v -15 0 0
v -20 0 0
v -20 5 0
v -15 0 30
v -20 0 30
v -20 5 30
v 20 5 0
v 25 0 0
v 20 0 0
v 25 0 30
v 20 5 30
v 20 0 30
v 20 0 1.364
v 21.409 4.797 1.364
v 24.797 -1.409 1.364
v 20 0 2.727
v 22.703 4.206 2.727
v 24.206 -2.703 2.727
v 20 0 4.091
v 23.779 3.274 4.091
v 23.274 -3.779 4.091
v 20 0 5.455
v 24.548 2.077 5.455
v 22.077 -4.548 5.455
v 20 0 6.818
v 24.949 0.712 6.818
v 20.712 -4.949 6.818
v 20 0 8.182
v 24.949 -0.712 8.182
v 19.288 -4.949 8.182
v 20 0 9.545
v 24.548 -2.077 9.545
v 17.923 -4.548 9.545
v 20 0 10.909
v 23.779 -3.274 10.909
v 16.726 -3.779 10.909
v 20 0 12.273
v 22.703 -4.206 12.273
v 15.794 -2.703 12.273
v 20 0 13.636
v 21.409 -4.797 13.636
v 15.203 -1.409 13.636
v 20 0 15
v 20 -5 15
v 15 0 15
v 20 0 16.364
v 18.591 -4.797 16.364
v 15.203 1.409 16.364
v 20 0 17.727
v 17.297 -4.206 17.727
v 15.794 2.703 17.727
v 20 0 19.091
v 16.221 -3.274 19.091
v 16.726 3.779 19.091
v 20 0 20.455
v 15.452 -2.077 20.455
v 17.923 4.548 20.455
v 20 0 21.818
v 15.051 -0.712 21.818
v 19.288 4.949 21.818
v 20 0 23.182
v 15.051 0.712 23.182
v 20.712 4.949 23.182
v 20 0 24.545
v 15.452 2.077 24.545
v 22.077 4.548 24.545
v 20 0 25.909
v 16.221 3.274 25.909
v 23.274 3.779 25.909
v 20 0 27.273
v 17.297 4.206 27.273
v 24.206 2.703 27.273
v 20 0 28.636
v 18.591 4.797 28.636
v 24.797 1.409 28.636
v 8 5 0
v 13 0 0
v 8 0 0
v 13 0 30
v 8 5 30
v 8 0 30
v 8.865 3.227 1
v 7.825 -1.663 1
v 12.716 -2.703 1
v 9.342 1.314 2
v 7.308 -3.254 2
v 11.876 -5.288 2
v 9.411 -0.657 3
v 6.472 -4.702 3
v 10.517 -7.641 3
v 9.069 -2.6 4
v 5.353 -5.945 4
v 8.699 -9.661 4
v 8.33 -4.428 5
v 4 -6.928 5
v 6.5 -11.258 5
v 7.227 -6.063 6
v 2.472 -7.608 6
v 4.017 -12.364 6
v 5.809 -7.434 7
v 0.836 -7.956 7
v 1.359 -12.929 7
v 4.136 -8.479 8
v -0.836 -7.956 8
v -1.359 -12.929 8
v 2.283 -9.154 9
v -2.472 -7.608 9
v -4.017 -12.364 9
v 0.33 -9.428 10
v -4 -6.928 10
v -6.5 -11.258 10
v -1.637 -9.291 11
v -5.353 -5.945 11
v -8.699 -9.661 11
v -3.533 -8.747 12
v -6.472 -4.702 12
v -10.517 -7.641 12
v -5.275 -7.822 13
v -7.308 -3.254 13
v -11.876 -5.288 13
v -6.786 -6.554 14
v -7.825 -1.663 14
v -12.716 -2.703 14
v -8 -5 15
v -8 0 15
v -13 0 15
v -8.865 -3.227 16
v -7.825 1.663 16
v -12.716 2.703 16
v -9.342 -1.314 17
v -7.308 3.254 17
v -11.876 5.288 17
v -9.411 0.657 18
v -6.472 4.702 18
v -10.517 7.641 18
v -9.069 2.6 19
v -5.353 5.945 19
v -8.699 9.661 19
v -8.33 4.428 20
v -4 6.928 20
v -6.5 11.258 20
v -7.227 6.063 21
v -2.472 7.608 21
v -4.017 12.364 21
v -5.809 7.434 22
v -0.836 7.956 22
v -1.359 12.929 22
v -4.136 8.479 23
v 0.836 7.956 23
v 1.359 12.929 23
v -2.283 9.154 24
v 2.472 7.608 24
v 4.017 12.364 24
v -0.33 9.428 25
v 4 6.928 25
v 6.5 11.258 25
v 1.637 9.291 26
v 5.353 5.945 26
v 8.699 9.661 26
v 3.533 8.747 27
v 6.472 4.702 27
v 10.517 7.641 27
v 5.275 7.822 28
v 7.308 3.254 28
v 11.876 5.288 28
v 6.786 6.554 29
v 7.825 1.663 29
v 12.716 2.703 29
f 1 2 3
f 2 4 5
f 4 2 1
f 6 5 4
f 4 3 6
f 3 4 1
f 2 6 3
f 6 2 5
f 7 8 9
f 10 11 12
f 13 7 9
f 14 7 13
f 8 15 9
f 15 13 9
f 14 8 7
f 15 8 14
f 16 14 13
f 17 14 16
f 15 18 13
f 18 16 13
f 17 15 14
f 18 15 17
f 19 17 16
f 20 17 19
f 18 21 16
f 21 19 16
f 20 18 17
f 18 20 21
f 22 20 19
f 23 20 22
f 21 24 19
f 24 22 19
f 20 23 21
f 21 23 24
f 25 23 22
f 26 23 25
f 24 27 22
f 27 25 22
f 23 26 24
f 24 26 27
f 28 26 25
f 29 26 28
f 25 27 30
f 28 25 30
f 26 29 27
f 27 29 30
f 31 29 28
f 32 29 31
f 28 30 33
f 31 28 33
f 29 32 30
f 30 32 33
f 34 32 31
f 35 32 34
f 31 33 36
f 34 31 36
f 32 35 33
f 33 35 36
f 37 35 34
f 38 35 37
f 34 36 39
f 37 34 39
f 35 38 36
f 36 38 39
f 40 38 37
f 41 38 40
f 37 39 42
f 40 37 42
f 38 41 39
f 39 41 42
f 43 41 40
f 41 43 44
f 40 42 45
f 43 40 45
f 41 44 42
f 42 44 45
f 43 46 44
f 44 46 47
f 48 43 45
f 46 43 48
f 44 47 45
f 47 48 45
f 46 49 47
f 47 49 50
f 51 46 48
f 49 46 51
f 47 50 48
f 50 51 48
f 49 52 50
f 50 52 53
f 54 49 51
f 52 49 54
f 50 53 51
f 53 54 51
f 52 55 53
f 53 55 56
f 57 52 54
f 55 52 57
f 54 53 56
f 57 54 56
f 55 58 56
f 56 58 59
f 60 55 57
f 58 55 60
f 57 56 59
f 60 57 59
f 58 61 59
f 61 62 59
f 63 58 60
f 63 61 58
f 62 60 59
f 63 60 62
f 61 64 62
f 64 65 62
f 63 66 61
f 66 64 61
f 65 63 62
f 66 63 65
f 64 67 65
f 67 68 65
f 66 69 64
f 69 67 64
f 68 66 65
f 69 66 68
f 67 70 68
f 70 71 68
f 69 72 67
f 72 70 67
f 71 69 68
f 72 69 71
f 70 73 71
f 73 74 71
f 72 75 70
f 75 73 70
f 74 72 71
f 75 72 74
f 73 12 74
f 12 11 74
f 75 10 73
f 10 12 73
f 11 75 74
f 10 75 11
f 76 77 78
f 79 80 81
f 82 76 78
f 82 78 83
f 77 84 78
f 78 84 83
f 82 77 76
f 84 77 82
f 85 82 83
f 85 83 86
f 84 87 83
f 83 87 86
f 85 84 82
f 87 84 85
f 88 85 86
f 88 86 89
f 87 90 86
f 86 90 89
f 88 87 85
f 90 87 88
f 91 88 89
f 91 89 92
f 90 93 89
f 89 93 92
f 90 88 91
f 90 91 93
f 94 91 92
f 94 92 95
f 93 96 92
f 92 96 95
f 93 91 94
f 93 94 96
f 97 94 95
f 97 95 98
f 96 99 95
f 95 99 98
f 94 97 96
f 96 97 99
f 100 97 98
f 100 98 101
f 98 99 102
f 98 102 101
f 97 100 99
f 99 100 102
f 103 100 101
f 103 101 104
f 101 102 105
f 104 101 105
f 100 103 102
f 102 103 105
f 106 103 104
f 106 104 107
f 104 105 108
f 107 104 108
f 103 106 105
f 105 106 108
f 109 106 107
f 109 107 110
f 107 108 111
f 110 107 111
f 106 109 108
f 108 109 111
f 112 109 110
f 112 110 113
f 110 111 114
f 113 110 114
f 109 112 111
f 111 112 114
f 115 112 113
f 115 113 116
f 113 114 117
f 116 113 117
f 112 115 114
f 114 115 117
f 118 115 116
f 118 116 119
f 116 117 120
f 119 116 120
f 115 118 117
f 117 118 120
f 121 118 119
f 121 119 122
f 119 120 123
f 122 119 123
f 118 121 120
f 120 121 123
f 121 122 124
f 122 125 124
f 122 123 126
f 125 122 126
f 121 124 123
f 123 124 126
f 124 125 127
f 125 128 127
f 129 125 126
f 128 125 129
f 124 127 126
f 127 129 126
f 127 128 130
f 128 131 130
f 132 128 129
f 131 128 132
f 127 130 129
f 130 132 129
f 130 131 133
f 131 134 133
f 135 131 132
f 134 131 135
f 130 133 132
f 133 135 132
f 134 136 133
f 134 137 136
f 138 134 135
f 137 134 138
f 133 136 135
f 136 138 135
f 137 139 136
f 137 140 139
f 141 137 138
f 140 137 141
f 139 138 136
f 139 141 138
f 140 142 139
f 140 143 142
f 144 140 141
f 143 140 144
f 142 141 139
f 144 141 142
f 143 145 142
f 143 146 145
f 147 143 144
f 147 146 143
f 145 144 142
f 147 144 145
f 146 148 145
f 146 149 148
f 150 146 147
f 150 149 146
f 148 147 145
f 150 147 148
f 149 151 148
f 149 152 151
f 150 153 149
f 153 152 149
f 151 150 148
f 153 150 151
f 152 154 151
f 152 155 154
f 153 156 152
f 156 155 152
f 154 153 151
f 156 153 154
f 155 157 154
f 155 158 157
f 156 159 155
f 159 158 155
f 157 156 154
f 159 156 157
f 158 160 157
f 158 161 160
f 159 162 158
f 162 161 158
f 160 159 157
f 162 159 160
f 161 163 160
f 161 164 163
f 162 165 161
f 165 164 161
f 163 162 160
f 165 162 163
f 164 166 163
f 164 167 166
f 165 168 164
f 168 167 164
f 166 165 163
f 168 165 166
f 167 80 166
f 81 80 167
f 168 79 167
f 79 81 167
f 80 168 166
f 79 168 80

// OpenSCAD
/*
 * polygon() creates a 2D shape in the XY plane.
 * linear_extrude() extends it into the Z plane.
 */

translate([-20,0,0]) 
linear_extrude(height=30)
polygon([
	[0,0],
	[0,5],
	[5,0],
]);

translate([20,0,0]) 
linear_extrude(height=30, twist=360)
polygon([
	[0,0],
	[0,5],
	[5,0],
]);

linear_extrude(height=30, twist=360)
translate([8,0,0]) 
polygon([
	[0,0],
	[0,5],
	[5,0],
]);

%cube([50,50,0.5], center=true);
